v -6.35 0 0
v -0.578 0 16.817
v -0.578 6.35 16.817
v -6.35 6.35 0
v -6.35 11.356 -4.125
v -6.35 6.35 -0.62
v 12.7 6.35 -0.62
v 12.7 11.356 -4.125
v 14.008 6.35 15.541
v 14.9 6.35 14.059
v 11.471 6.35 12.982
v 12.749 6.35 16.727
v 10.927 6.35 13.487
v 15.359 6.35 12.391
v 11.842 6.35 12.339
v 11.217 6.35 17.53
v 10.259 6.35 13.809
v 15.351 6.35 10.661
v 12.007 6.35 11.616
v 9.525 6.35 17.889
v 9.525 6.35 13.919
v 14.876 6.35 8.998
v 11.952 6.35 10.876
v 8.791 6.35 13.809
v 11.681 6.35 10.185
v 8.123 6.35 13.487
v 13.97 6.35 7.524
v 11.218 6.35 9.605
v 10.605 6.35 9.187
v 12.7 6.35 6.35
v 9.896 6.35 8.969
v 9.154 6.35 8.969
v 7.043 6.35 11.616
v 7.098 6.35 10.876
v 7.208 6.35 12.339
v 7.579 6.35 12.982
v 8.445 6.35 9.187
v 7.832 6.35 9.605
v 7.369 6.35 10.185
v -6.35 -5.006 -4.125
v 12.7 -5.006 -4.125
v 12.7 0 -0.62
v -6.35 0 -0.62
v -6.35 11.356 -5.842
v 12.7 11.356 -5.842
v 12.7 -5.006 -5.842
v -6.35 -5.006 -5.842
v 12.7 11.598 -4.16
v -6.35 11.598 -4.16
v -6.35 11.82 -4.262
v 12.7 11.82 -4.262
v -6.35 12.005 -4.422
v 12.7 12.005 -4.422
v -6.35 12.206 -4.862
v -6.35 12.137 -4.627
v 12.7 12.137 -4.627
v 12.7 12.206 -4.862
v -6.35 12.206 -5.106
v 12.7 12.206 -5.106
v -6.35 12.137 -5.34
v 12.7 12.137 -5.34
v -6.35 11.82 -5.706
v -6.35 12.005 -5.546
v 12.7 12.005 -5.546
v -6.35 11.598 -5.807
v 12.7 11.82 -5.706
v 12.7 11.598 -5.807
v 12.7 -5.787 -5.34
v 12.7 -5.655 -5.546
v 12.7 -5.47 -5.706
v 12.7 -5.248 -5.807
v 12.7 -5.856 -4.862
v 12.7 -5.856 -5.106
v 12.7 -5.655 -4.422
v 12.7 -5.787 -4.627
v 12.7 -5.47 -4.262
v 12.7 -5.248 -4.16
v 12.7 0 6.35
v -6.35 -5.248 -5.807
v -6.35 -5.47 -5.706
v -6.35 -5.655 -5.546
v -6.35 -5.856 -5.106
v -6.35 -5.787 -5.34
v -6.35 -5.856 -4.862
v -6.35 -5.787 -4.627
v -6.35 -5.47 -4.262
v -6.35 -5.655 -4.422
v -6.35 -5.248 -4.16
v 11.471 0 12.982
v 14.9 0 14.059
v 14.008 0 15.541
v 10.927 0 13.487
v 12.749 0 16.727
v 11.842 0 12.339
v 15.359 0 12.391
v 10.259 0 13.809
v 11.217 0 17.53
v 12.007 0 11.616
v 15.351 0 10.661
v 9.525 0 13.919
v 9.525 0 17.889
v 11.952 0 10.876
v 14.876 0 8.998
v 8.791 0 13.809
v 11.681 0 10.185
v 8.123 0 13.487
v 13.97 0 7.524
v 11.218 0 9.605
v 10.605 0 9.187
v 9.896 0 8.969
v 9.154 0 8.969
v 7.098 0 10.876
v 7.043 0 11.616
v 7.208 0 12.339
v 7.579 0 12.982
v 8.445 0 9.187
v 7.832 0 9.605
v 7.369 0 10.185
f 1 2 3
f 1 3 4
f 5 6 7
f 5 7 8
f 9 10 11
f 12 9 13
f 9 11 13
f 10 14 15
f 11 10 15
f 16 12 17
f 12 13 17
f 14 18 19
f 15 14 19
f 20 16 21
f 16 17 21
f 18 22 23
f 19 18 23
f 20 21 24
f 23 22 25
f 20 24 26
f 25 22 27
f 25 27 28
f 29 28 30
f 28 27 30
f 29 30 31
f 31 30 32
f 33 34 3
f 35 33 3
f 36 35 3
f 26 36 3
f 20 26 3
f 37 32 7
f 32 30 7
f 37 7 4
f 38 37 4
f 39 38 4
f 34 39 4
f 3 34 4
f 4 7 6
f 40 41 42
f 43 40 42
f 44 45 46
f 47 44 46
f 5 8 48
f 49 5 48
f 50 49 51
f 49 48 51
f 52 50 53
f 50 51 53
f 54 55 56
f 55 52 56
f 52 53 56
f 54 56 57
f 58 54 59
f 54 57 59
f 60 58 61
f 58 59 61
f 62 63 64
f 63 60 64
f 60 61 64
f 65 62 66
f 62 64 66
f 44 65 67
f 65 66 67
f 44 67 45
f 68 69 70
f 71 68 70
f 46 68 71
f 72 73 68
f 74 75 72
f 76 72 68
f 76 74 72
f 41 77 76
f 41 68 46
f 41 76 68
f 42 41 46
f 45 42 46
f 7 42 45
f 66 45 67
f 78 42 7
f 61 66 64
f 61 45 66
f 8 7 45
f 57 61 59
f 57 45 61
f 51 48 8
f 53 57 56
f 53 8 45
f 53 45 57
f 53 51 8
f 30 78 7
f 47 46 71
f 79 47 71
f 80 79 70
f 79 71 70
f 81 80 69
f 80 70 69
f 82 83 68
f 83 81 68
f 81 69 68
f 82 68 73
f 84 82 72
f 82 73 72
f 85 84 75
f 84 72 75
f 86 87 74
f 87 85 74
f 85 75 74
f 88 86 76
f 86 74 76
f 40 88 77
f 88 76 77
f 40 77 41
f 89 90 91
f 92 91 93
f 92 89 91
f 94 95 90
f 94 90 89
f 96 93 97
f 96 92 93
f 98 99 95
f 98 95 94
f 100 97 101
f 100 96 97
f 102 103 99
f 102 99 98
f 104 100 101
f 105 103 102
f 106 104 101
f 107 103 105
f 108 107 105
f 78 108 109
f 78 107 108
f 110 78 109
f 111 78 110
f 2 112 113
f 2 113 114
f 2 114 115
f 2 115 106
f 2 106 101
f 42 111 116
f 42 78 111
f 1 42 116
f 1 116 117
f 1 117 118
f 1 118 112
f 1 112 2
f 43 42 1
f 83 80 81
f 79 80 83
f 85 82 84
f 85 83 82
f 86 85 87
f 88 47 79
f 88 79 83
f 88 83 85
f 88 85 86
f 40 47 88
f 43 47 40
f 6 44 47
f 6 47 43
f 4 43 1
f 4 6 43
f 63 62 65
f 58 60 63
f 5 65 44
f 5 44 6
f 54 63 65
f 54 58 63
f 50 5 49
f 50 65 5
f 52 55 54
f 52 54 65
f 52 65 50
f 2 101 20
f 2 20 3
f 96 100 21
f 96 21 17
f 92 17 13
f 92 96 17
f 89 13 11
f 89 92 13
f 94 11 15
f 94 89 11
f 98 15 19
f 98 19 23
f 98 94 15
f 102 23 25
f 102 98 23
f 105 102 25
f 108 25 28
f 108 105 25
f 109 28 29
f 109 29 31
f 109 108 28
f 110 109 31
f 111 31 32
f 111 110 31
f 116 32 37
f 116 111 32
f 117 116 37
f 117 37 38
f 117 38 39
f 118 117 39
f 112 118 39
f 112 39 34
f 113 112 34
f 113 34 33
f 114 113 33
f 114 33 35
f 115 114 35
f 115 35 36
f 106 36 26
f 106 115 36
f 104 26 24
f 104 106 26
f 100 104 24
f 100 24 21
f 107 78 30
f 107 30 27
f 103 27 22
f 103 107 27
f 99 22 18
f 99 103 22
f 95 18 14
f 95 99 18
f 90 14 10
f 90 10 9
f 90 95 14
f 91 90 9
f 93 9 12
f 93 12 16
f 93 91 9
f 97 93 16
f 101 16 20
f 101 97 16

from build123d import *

# Parameters (mm, degrees)
SKETCH1_R               = 2.4892
BOSS_EXTRUDE1_DEPTH     = 6.35
BOSS_EXTRUDE2_START     = -6.35
BOSS_EXTRUDE2_DEPTH     = 19.05
BOSS_EXTRUDE2_START_2   = -6.555460136
BOSS_EXTRUDE2_2_DEPTH   = 19.460920272
BOSS_EXTRUDE2_START_3   = -10
BOSS_EXTRUDE2_3_DEPTH   = 3.65
CUT_EXTRUDE1_DEPTH      = 27.910448217
CUT_EXTRUDE1_DEPTH_BACK = 27.910448217
SKETCH3_W               = 2.179354936
SKETCH3_H               = 6.35
CUT_EXTRUDE2_DEPTH      = 31.98795935
CUT_EXTRUDE2_DEPTH_BACK = 31.98795935


with BuildPart() as part:
    # Sketch1 → Boss-Extrude1 (new body)
    with BuildSketch(Plane(origin=(0, 0, 0), x_dir=(1, 0, 0), z_dir=(0, 1, 0))):
        with BuildLine():
            Line((9.525, -17.889269346), (-0.578271622, -16.817120786))
            Line((-0.578271622, -16.817120786), (-6.35, 0))
            Line((-6.35, 0), (12.7, 0))
            Line((12.7, 0), (12.7, -6.35))
            ThreePointArc((12.7, -6.35), (15.186560179, -13.240601753), (9.525, -17.889269346))
        make_face()
        with Locations(Location((9.525, -11.43, 0), (0, 0, 270))):
            Circle(SKETCH1_R, mode=Mode.SUBTRACT)
    extrude(amount=BOSS_EXTRUDE1_DEPTH)

    # Boss-Extrude2: read off the stored shape, not the designer's step
    # Boss-Extrude2 outline → Boss-Extrude2 (add)
    with BuildSketch(Plane.YZ.offset(BOSS_EXTRUDE2_START)):
        with BuildLine():
            ThreePointArc((11.551615481, -6.35), (12.905510296, -4.996105185), (11.551615481, -3.642210371))
            Line((11.551615481, -3.642210371), (6.35, 0))
            Line((6.35, 0), (0, 0))
            Line((0, 0), (-5.201615481, -3.642210371))
            ThreePointArc((-5.201615481, -3.642210371), (-6.555510296, -4.996105185), (-5.201615481, -6.35))
            Line((-5.201615481, -6.35), (11.551615481, -6.35))
        make_face()
    extrude(amount=BOSS_EXTRUDE2_DEPTH)

    # Boss-Extrude2 2 outline → Boss-Extrude2 2 (add)
    with BuildSketch(Plane(origin=(0, 0, 0), x_dir=(1, 0, 0), z_dir=(0, 1, 0)).offset(BOSS_EXTRUDE2_START_2)):
        Polygon((-8.529354936, 6.35), (-6.35, 0), (-6.35, 6.35), align=None)
    extrude(amount=BOSS_EXTRUDE2_2_DEPTH)

    # Boss-Extrude2 3 outline → Boss-Extrude2 3 (cut)
    with BuildSketch(Plane.YZ.offset(BOSS_EXTRUDE2_START_3)):
        with BuildLine():
            Line((12.905460136, 0), (6.35, 0))
            Line((6.35, 0), (11.551615481, -3.642210371))
            ThreePointArc((11.551615481, -3.642210371), (12.504834401, -4.034645431), (12.905460136, -4.984450993))
            Line((12.905460136, -4.984450993), (12.905460136, 0))
        make_face()
        with BuildLine():
            ThreePointArc((12.905460136, -5.007759378), (12.504834401, -5.95756494), (11.551615481, -6.35))
            Line((11.551615481, -6.35), (12.905460136, -6.35))
            Line((12.905460136, -6.35), (12.905460136, -5.007759378))
        make_face()
        with BuildLine():
            Line((0, 0), (-6.555460136, 0))
            Line((-6.555460136, 0), (-6.555460136, -4.984450993))
            ThreePointArc((-6.555460136, -4.984450993), (-6.154834401, -4.034645431), (-5.201615481, -3.642210371))
            Line((-5.201615481, -3.642210371), (0, 0))
        make_face()
        with BuildLine():
            ThreePointArc((-5.201615481, -6.35), (-6.154834401, -5.95756494), (-6.555460136, -5.007759378))
            Line((-6.555460136, -5.007759378), (-6.555460136, -6.35))
            Line((-6.555460136, -6.35), (-5.201615481, -6.35))
        make_face()
    extrude(amount=BOSS_EXTRUDE2_3_DEPTH, mode=Mode.SUBTRACT)

    # Sketch3 → Cut-Extrude1 (cut, two sides: drawn at the far end of the back side and taken through both)
    with BuildSketch(Plane.XZ.offset(-CUT_EXTRUDE1_DEPTH_BACK)):
        with Locations((-7.439677468, -3.175)):
            Rectangle(SKETCH3_W, SKETCH3_H)
    extrude(amount=CUT_EXTRUDE1_DEPTH + CUT_EXTRUDE1_DEPTH_BACK, mode=Mode.SUBTRACT)

    # Sketch4 → Cut-Extrude2 (cut, two sides: drawn at the far end of the back side and taken through both)
    with BuildSketch(Plane.ZY.offset(6.35).offset(-CUT_EXTRUDE2_DEPTH_BACK)):
        with BuildLine():
            ThreePointArc((-5.842, -5.006022622), (-4.983704134, -5.864318488), (-4.125408268, -5.006022622))
            Line((-4.125408268, -5.006022622), (-0.620153491, 0))
            Line((-0.620153491, 0), (0, 0))
            Line((0, 0), (-3.642210371, -5.201615481))
            ThreePointArc((-3.642210371, -5.201615481), (-4.996105185, -6.555510296), (-6.35, -5.201615481))
            Line((-6.35, -5.201615481), (-6.35, 11.551615481))
            ThreePointArc((-6.35, 11.551615481), (-4.996105185, 12.905510296), (-3.642210371, 11.551615481))
            Line((-3.642210371, 11.551615481), (0, 6.35))
            Line((0, 6.35), (-0.620153491, 6.35))
            Line((-0.620153491, 6.35), (-4.125408268, 11.356022622))
            ThreePointArc((-4.125408268, 11.356022622), (-4.983704134, 12.214318488), (-5.842, 11.356022622))
            Line((-5.842, 11.356022622), (-5.842, -5.006022622))
        make_face()
    extrude(amount=CUT_EXTRUDE2_DEPTH + CUT_EXTRUDE2_DEPTH_BACK, mode=Mode.SUBTRACT)


solid = part.part
